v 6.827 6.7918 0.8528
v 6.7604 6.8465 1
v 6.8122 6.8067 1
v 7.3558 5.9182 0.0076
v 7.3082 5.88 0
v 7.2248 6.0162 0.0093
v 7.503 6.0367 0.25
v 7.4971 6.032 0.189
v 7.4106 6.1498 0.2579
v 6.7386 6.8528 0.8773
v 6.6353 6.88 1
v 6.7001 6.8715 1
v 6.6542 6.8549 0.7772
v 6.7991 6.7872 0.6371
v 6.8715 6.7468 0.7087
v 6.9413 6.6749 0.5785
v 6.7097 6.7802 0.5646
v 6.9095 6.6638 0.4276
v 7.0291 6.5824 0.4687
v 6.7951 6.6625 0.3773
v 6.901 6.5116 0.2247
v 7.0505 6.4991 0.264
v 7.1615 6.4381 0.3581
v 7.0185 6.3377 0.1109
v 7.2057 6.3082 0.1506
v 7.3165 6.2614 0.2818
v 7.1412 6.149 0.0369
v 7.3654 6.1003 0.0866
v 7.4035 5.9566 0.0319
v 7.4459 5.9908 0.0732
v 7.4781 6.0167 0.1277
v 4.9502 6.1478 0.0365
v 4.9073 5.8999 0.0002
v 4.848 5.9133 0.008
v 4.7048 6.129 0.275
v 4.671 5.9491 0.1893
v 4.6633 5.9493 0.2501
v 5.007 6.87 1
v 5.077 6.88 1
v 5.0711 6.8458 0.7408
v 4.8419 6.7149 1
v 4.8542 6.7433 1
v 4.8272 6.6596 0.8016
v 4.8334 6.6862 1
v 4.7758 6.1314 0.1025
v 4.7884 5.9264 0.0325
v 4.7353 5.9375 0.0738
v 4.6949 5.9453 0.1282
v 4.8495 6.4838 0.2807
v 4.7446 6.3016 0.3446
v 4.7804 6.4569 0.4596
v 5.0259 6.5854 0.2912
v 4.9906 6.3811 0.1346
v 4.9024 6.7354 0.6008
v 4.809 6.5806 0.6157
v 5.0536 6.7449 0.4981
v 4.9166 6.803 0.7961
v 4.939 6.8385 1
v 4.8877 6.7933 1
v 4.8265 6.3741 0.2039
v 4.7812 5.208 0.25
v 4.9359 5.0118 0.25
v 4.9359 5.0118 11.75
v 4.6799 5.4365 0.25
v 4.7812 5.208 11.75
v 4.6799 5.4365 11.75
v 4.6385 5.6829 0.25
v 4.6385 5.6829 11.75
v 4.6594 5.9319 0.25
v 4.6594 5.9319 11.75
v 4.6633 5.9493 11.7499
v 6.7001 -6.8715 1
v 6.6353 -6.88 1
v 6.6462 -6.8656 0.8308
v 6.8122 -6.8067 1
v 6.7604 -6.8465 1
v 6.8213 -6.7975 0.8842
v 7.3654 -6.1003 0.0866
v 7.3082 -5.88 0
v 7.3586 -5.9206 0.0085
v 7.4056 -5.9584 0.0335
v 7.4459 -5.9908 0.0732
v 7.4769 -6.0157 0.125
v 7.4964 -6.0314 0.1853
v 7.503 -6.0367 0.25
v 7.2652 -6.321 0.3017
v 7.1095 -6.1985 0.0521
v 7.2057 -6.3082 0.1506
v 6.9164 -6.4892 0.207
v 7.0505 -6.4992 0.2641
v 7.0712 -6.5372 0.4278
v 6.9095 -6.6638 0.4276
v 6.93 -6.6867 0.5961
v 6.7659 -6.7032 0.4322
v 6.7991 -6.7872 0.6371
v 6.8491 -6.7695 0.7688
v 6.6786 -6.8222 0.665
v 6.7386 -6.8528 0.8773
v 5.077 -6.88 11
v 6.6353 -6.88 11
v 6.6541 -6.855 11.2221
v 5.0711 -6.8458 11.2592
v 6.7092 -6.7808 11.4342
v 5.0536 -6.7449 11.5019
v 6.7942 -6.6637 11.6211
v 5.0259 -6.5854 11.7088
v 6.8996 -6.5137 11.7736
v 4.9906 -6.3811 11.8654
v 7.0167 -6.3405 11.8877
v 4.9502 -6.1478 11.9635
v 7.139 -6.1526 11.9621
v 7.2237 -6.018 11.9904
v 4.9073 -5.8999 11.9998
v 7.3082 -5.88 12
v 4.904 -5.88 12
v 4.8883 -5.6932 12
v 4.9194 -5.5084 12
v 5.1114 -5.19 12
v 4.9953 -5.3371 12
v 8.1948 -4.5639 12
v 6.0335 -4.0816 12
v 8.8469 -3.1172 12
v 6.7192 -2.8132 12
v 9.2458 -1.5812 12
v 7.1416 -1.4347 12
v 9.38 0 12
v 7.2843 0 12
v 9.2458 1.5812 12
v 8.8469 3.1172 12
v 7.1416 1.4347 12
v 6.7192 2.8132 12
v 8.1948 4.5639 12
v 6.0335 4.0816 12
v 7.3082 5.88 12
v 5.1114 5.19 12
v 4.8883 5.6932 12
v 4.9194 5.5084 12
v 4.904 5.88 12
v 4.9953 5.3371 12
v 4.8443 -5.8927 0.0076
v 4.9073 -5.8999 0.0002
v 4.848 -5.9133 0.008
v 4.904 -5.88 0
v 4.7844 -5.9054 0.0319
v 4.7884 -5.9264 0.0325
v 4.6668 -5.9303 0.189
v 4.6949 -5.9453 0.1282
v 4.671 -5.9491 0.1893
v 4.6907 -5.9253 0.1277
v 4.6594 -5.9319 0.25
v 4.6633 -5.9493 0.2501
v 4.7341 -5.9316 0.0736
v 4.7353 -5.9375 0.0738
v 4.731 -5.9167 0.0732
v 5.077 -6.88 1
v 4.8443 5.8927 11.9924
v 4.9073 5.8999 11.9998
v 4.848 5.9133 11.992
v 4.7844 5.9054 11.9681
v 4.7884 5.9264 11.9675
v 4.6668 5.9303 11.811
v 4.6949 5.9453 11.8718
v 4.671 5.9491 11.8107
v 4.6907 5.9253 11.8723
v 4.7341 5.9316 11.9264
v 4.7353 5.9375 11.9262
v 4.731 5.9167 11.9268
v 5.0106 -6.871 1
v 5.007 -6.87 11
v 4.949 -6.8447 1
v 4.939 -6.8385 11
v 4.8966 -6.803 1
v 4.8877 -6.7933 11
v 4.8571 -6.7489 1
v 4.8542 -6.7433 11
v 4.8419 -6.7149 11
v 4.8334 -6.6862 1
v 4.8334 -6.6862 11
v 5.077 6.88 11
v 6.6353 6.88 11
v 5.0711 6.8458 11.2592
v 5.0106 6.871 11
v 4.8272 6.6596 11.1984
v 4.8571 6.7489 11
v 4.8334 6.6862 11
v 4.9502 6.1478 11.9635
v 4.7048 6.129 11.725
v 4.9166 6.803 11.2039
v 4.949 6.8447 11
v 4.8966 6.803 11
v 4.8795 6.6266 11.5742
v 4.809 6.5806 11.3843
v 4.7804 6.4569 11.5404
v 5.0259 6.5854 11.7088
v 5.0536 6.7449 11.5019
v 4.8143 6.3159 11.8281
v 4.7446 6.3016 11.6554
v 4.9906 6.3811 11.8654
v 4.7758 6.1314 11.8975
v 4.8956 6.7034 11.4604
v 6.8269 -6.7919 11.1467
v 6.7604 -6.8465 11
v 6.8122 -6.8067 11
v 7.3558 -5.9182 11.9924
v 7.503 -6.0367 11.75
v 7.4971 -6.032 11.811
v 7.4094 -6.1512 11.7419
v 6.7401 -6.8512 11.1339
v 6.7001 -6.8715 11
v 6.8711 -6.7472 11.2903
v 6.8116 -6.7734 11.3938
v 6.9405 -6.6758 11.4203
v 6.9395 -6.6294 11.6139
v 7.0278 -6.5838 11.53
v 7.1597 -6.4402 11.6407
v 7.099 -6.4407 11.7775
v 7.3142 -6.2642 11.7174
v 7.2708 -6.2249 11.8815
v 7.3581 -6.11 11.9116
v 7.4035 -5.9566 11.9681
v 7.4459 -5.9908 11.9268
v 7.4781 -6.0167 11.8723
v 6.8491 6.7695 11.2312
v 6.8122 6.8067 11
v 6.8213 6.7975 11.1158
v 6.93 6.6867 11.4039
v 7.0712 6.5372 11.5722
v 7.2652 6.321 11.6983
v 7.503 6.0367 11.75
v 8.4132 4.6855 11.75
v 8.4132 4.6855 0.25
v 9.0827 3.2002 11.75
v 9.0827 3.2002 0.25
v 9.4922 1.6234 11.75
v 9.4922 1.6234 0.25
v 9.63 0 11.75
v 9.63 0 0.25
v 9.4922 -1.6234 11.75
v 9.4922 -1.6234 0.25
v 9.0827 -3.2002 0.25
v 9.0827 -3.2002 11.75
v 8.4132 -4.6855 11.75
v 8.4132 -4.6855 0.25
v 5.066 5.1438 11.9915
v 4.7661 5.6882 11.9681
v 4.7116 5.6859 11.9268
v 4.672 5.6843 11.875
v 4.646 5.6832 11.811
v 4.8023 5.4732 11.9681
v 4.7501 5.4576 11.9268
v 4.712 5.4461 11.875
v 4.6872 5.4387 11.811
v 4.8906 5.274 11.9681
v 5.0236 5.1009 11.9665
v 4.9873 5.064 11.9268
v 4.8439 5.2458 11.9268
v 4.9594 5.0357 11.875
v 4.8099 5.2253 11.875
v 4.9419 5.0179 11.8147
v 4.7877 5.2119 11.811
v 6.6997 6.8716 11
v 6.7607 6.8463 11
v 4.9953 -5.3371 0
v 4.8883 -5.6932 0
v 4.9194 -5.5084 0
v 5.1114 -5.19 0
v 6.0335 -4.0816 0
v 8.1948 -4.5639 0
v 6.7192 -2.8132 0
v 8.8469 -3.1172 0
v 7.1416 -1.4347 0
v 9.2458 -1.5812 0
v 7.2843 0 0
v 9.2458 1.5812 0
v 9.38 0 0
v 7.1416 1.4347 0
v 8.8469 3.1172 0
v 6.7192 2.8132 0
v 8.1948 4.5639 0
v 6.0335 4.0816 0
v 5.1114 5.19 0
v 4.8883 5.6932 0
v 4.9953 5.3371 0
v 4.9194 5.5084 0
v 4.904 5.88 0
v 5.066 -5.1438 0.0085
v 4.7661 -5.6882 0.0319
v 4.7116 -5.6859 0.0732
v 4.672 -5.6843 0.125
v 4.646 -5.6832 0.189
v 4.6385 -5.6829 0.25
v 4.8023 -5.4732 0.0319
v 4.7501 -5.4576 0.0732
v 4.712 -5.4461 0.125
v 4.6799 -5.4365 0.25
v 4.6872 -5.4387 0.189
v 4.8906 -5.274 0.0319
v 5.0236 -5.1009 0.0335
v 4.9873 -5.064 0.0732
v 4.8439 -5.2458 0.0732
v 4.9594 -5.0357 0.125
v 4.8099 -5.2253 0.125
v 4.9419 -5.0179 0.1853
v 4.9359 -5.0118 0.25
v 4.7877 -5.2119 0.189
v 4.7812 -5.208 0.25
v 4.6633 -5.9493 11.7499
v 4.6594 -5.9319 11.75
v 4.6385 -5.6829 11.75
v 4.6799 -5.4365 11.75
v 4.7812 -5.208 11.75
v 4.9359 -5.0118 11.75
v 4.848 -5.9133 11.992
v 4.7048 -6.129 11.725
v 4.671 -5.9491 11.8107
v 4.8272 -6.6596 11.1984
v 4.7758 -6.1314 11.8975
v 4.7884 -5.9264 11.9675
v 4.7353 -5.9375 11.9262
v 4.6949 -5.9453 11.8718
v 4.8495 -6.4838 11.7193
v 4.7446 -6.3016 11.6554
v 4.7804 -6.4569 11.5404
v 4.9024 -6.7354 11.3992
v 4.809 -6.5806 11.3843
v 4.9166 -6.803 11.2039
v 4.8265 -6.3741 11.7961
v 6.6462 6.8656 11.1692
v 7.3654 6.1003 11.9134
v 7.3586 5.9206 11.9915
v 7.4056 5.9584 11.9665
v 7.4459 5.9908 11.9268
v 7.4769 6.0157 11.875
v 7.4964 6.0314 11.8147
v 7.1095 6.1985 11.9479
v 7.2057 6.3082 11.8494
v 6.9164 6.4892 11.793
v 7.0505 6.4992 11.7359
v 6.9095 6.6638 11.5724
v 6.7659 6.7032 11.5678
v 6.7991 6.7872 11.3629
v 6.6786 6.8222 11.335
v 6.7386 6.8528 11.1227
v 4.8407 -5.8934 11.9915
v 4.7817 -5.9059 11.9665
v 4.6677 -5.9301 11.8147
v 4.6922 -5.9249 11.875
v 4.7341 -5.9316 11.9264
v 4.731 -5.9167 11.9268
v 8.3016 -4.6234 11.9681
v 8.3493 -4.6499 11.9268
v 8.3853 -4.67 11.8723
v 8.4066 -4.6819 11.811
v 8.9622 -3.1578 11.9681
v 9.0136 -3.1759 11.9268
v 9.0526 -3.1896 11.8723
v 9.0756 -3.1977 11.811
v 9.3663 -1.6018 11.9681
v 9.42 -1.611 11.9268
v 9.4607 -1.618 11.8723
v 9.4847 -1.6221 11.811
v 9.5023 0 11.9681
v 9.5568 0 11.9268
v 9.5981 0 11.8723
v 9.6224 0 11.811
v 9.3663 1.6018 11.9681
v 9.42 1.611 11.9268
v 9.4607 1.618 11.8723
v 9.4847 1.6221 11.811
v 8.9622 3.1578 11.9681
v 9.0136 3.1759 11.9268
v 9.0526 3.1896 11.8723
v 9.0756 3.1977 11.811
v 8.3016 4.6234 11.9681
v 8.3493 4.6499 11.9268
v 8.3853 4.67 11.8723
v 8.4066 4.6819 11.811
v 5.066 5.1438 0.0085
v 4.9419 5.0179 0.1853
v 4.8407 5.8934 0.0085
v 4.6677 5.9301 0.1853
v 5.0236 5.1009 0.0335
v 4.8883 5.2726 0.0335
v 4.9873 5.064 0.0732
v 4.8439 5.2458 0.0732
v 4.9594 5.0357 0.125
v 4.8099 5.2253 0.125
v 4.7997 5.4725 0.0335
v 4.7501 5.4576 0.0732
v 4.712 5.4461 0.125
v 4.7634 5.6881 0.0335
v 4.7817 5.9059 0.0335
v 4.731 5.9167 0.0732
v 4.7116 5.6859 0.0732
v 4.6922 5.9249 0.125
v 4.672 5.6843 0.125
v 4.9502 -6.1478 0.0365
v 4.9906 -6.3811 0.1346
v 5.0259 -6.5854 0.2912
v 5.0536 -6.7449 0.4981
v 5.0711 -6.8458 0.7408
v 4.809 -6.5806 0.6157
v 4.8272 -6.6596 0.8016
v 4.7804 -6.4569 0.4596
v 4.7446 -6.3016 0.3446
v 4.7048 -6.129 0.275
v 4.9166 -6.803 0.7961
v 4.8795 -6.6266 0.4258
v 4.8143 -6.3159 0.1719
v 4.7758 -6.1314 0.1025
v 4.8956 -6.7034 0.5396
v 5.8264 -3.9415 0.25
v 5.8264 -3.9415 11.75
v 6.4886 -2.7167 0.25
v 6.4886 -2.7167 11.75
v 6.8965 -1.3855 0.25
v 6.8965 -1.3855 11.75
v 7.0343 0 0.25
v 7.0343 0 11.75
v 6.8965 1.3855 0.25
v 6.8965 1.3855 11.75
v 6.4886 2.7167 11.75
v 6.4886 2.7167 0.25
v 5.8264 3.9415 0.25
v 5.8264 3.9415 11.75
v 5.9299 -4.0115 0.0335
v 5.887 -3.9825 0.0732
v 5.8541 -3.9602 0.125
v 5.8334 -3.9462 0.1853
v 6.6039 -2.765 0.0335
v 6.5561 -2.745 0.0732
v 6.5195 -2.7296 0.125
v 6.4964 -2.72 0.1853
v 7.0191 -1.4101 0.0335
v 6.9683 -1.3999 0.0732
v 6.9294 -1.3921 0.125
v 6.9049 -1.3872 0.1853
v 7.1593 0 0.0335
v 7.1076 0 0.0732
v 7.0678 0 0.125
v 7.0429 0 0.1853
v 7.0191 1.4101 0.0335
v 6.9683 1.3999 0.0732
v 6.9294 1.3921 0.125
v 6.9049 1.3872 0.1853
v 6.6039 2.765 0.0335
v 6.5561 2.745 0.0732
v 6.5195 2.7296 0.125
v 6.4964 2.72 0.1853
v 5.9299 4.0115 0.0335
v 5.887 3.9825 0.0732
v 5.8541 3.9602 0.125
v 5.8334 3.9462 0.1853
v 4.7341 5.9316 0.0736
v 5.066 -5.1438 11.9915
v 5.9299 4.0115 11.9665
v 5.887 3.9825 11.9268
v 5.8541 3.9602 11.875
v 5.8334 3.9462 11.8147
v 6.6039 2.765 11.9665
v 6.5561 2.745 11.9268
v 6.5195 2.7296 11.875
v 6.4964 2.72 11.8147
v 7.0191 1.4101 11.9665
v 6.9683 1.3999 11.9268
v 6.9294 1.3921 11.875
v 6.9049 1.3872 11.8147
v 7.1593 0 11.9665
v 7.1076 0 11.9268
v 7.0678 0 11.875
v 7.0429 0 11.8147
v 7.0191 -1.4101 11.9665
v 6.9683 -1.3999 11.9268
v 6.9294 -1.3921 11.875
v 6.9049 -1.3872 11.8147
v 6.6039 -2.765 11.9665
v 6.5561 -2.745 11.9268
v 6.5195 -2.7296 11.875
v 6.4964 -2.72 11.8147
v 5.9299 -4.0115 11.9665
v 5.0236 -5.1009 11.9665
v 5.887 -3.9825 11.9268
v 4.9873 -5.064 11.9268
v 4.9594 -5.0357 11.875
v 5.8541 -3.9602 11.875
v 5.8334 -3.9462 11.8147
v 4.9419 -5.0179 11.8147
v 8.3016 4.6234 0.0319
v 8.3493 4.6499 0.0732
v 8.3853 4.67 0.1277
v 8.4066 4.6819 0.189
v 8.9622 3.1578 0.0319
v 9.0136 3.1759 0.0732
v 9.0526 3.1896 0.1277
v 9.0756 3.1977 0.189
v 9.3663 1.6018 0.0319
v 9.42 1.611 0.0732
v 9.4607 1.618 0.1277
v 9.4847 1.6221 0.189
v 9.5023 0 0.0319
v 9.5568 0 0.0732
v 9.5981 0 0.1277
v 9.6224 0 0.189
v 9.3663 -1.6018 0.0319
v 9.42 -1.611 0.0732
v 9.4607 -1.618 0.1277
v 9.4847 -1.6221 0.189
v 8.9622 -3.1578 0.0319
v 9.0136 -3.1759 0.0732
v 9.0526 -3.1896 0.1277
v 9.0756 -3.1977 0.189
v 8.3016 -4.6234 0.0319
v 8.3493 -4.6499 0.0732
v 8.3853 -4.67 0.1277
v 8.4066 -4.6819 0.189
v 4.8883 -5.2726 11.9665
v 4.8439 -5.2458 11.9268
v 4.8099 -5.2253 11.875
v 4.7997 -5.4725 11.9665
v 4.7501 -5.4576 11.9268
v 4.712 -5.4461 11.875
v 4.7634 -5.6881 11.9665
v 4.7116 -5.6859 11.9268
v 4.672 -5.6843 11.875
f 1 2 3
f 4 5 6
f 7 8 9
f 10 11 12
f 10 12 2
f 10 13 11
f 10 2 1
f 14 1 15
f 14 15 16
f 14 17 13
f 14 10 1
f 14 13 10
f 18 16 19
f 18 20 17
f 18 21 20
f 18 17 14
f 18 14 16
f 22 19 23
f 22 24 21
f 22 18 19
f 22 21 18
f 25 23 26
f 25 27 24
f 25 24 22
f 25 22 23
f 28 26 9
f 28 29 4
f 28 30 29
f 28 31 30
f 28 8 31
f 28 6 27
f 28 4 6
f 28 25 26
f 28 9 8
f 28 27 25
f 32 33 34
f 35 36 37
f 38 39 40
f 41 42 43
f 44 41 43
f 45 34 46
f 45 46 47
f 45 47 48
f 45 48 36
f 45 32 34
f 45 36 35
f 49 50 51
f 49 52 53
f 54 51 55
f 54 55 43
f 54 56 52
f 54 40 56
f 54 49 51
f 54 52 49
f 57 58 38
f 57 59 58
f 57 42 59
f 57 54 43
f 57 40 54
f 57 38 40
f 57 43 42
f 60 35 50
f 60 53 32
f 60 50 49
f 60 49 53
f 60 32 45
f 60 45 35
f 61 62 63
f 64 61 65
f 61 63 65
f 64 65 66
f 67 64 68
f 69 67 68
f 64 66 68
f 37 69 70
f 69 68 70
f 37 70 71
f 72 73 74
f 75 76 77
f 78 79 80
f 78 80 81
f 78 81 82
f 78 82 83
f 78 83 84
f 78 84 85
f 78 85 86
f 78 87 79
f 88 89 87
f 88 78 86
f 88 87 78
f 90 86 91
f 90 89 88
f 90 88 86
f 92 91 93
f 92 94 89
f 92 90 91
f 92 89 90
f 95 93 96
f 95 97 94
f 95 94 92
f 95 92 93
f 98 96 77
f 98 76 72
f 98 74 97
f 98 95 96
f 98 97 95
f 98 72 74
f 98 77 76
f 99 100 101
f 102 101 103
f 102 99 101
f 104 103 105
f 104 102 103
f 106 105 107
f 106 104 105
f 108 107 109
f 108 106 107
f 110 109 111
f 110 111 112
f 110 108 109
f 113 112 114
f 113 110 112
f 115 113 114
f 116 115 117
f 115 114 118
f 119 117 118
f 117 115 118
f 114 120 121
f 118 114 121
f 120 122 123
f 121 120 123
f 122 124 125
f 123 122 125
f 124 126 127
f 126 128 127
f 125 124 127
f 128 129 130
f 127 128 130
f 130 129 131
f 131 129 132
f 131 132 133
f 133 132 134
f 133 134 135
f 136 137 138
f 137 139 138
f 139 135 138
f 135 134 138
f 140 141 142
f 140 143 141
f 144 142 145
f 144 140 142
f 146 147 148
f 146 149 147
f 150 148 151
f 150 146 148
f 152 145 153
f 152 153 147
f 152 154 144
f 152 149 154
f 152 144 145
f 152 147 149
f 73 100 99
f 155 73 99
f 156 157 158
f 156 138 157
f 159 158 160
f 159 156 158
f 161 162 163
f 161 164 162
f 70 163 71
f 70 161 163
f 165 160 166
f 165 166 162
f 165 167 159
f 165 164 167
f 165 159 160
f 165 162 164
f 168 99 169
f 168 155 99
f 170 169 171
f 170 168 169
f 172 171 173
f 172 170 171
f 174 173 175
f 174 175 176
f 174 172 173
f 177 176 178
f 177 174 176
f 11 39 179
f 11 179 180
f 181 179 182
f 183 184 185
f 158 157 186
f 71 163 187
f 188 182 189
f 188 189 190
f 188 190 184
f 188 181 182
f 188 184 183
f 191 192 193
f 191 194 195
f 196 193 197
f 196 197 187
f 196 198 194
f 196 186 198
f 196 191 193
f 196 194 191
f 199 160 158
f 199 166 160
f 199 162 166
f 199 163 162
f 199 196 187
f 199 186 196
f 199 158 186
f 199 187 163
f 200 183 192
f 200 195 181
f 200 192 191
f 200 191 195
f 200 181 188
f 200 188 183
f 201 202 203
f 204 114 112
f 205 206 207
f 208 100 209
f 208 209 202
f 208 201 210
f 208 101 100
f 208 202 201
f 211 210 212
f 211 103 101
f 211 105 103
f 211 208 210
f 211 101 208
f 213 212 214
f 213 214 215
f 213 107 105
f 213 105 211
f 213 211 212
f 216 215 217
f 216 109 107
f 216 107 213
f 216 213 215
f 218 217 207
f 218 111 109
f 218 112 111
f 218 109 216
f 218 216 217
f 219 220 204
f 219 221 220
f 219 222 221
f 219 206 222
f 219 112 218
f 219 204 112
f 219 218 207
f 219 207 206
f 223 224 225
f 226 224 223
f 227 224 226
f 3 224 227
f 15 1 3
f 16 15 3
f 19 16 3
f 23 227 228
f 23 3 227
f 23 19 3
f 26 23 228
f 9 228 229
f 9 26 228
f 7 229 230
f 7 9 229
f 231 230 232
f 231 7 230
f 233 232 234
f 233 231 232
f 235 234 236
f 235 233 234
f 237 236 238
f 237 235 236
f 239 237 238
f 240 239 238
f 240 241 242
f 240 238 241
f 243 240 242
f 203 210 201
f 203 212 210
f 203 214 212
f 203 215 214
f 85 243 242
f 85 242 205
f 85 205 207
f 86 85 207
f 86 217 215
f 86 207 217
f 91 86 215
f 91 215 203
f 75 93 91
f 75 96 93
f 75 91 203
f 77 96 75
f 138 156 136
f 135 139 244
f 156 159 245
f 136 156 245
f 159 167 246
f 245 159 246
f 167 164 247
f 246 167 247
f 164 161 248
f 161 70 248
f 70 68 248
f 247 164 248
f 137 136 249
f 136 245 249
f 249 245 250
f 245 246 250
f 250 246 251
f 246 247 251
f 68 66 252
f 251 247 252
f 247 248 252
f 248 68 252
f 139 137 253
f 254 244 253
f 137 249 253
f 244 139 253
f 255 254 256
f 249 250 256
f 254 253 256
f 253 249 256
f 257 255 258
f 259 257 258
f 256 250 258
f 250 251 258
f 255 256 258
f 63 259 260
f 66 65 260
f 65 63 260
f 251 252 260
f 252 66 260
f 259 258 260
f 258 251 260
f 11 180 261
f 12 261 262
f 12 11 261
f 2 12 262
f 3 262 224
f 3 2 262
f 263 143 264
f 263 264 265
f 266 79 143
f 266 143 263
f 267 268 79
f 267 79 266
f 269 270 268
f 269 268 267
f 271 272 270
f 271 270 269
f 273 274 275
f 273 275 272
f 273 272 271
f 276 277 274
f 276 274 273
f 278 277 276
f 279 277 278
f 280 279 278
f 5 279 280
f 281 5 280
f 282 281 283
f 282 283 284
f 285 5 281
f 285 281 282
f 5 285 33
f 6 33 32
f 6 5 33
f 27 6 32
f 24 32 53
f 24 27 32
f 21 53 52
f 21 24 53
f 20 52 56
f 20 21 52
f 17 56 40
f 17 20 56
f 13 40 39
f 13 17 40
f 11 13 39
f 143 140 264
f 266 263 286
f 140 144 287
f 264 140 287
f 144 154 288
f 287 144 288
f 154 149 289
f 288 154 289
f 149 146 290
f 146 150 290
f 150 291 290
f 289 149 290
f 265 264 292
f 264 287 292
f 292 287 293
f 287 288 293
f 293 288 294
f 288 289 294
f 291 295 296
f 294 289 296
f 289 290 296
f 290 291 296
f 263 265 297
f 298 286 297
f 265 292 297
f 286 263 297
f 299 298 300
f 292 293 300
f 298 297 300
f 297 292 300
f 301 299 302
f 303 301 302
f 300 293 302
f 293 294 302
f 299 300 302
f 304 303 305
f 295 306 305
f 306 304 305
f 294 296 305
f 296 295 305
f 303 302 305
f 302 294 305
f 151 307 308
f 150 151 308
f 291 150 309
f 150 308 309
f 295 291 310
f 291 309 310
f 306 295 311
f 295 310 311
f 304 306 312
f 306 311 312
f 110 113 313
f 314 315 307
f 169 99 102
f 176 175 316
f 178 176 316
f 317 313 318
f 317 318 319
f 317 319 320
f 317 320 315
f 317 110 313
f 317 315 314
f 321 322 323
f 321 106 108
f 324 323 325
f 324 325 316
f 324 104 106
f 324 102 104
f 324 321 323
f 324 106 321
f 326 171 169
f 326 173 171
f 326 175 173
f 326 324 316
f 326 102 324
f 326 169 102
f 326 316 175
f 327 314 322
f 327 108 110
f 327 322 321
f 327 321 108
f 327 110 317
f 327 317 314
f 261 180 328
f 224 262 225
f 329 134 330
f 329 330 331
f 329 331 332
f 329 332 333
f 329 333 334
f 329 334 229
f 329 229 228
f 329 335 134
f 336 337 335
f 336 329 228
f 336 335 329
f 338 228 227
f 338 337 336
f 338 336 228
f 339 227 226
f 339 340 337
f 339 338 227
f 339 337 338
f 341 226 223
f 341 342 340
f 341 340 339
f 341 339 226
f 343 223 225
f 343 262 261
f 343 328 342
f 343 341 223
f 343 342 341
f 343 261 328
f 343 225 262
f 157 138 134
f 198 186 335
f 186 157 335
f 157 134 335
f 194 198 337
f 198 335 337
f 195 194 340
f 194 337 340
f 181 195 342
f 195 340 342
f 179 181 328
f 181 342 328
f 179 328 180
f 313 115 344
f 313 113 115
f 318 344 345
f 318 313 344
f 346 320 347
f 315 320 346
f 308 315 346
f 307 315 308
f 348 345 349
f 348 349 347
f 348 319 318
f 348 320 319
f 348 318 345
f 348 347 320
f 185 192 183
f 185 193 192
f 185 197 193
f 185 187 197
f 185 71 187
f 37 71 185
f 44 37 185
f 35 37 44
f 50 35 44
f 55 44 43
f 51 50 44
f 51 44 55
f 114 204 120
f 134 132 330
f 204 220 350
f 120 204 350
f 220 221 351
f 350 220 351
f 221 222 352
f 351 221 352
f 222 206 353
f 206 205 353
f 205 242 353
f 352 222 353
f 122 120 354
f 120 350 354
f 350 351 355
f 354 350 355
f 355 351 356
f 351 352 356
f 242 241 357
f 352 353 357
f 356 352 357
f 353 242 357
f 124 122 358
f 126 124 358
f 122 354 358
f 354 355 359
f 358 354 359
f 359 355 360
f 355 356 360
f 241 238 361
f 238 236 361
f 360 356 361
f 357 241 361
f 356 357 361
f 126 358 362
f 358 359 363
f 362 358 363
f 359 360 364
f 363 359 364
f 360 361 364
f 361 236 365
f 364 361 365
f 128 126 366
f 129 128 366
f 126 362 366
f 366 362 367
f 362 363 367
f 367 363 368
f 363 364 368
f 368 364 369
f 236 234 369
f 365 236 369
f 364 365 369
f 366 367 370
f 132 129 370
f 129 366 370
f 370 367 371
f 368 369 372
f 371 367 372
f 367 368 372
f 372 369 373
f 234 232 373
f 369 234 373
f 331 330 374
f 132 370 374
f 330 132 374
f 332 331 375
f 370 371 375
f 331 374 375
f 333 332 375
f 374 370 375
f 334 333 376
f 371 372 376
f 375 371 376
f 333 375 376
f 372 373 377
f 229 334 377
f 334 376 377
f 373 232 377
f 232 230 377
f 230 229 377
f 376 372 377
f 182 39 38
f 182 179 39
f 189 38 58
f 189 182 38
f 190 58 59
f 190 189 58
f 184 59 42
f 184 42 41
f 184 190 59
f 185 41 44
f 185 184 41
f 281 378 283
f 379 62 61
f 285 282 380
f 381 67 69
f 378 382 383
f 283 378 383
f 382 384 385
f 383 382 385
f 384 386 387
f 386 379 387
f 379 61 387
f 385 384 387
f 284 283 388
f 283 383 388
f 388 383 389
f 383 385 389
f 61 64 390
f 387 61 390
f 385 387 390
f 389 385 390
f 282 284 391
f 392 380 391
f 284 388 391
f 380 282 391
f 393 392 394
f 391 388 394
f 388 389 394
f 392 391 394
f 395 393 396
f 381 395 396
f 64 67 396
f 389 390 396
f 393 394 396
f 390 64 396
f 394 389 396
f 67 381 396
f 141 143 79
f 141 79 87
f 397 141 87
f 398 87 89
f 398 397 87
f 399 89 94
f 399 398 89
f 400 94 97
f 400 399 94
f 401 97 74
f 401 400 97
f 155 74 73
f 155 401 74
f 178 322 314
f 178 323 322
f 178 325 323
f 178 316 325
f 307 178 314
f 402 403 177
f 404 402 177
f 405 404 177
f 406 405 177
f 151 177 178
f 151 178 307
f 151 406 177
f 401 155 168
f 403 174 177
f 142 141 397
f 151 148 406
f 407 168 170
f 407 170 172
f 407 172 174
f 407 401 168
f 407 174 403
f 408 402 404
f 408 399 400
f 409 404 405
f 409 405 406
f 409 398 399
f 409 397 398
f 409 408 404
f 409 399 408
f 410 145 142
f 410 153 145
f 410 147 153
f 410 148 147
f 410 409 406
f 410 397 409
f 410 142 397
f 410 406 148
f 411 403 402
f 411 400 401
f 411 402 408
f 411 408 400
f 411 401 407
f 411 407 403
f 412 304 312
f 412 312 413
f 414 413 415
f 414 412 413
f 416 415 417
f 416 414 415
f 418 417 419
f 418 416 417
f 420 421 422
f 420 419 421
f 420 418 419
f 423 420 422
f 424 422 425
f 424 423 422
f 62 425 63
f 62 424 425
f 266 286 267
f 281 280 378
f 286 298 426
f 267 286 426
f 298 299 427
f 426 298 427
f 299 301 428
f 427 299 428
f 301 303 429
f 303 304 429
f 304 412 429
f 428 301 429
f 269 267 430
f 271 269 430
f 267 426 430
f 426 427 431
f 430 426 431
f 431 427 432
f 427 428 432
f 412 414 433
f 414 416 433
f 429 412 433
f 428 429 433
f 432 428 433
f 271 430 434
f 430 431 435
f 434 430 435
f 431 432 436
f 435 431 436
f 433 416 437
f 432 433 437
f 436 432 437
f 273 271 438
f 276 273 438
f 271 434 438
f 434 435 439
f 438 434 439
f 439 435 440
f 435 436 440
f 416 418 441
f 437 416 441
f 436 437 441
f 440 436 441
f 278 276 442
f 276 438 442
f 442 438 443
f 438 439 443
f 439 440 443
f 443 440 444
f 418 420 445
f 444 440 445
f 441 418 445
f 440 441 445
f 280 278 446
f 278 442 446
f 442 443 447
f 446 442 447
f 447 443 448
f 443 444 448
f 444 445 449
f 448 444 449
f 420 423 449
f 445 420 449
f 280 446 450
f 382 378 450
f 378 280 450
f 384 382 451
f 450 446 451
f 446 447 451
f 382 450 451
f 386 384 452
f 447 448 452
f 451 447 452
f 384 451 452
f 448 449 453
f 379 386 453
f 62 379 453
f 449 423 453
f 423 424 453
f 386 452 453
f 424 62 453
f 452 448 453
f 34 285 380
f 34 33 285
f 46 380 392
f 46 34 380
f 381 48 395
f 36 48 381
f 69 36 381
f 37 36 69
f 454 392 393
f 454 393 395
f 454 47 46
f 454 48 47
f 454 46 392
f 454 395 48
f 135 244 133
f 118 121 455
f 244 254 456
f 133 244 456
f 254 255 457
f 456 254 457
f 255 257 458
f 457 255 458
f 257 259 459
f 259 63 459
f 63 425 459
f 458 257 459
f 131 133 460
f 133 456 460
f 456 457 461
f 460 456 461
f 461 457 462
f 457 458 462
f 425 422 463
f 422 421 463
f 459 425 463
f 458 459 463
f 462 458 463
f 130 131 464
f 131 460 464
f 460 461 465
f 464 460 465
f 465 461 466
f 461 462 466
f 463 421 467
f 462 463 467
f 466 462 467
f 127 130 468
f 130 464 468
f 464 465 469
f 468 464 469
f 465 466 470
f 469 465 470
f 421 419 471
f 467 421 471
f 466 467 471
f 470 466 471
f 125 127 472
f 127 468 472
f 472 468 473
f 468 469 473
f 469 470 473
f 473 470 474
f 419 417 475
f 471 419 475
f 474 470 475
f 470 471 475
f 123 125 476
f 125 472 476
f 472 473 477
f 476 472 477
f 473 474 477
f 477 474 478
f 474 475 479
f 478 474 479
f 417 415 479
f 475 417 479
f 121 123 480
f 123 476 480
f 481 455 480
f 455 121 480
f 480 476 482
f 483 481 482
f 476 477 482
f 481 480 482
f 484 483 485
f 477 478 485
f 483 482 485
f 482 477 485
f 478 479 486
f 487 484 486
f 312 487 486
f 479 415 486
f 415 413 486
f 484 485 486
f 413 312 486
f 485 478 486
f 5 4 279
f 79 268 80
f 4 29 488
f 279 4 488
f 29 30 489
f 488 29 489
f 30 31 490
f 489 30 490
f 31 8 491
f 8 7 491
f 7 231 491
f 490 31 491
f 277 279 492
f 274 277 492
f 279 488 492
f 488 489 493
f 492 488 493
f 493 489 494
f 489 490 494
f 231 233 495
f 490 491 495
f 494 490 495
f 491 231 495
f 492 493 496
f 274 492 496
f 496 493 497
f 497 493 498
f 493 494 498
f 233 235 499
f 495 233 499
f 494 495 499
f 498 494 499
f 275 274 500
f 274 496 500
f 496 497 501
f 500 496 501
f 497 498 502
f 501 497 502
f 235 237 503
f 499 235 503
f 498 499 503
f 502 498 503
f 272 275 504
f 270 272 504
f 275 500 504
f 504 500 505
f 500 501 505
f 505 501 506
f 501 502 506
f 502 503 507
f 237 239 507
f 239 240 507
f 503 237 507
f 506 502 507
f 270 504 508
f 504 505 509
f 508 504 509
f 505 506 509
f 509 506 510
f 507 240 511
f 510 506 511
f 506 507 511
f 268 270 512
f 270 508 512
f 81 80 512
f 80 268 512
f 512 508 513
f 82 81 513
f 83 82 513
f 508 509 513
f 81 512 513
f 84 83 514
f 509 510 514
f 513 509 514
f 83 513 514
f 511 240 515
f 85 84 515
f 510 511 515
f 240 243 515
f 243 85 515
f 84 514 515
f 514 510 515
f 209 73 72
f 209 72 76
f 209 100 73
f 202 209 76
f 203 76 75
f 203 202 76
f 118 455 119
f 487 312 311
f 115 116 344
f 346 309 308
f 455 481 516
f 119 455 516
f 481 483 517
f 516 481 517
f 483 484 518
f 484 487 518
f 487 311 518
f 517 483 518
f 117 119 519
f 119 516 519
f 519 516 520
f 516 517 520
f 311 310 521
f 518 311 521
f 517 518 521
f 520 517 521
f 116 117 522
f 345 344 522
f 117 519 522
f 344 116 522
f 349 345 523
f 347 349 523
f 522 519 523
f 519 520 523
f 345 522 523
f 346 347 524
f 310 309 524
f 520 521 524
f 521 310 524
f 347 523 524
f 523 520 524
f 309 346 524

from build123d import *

# Parameters (mm, degrees)
BOSS_EXTRUDE1_DEPTH = 12
FILLET1_R           = 1
FILLET2_R           = 1
FILLET3_R           = 0.25


with BuildPart() as part:
    # Sketch1 → Boss-Extrude1 (new body)
    with BuildSketch(Plane.XY):
        with BuildLine():
            Line((6.738137725, -6.88), (4.878137725, -6.88))
            Line((4.878137725, -6.88), (4.531835438, -5.38))
            ThreePointArc((4.531835438, -5.38), (7.034339517, 0), (4.531835438, 5.38))
            Line((4.531835438, 5.38), (4.878137725, 6.88))
            Line((4.878137725, 6.88), (6.738137725, 6.88))
            ThreePointArc((6.738137725, 6.88), (9.63, 0), (6.738137725, -6.88))
        make_face()
    extrude(amount=BOSS_EXTRUDE1_DEPTH)

    # Fillet1
    fillet1_edges = [part.edges().sort_by_distance(p)[0] for p in [
        (4.531835438, -5.38, 6),
        (4.531835438, 5.38, 6),
    ]]
    fillet(fillet1_edges, radius=FILLET1_R)

    # Fillet2
    fillet2_edges = [part.edges().sort_by_distance(p)[0] for p in [
        (5.808137725, -6.88, 0),
        (5.808137725, 6.88, 0),
        (5.808137725, -6.88, 12),
        (5.808137725, 6.88, 12),
    ]]
    fillet(fillet2_edges, radius=FILLET2_R)

    # Fillet3
    fillet3_edges = [part.edges().sort_by_distance(p)[0] for p in [
        (7.034339517, 0, 0),
        (4.687877266, 5.411310183, 0),
        (7.034339517, 0, 12),
        (4.687877266, -5.411310183, 12),
        (6.738137725, -6.88, 6),
        (4.878137725, -6.88, 6),
        (9.63, 0, 0),
        (6.738137725, 6.88, 6),
        (9.63, 0, 12),
        (7.064336577, 6.544619807, 11.7471817),
        (7.064336589, -6.544619821, 11.747181705),
        (7.064336577, 6.544619807, 0.2528183),
        (7.064336577, -6.544619807, 0.2528183),
        (4.687877266, -5.411310183, 0),
        (4.655934772, -5.914769545, 11.999395357),
        (4.655934772, -5.914769545, 0.000604643),
        (4.815123489, -6.607055355, 11.686578845),
        (4.815123489, -6.607055355, 0.313421155),
        (4.878137725, 6.88, 6),
        (4.815123489, 6.607055355, 11.686578845),
        (4.815123489, 6.607055355, 0.313421155),
        (4.687877266, 5.411310183, 12),
        (4.655934776, 5.914769544, 11.99939535),
        (4.655934776, 5.914769544, 0.00060465),
    ]]
    fillet(fillet3_edges, radius=FILLET3_R)


solid = part.part
